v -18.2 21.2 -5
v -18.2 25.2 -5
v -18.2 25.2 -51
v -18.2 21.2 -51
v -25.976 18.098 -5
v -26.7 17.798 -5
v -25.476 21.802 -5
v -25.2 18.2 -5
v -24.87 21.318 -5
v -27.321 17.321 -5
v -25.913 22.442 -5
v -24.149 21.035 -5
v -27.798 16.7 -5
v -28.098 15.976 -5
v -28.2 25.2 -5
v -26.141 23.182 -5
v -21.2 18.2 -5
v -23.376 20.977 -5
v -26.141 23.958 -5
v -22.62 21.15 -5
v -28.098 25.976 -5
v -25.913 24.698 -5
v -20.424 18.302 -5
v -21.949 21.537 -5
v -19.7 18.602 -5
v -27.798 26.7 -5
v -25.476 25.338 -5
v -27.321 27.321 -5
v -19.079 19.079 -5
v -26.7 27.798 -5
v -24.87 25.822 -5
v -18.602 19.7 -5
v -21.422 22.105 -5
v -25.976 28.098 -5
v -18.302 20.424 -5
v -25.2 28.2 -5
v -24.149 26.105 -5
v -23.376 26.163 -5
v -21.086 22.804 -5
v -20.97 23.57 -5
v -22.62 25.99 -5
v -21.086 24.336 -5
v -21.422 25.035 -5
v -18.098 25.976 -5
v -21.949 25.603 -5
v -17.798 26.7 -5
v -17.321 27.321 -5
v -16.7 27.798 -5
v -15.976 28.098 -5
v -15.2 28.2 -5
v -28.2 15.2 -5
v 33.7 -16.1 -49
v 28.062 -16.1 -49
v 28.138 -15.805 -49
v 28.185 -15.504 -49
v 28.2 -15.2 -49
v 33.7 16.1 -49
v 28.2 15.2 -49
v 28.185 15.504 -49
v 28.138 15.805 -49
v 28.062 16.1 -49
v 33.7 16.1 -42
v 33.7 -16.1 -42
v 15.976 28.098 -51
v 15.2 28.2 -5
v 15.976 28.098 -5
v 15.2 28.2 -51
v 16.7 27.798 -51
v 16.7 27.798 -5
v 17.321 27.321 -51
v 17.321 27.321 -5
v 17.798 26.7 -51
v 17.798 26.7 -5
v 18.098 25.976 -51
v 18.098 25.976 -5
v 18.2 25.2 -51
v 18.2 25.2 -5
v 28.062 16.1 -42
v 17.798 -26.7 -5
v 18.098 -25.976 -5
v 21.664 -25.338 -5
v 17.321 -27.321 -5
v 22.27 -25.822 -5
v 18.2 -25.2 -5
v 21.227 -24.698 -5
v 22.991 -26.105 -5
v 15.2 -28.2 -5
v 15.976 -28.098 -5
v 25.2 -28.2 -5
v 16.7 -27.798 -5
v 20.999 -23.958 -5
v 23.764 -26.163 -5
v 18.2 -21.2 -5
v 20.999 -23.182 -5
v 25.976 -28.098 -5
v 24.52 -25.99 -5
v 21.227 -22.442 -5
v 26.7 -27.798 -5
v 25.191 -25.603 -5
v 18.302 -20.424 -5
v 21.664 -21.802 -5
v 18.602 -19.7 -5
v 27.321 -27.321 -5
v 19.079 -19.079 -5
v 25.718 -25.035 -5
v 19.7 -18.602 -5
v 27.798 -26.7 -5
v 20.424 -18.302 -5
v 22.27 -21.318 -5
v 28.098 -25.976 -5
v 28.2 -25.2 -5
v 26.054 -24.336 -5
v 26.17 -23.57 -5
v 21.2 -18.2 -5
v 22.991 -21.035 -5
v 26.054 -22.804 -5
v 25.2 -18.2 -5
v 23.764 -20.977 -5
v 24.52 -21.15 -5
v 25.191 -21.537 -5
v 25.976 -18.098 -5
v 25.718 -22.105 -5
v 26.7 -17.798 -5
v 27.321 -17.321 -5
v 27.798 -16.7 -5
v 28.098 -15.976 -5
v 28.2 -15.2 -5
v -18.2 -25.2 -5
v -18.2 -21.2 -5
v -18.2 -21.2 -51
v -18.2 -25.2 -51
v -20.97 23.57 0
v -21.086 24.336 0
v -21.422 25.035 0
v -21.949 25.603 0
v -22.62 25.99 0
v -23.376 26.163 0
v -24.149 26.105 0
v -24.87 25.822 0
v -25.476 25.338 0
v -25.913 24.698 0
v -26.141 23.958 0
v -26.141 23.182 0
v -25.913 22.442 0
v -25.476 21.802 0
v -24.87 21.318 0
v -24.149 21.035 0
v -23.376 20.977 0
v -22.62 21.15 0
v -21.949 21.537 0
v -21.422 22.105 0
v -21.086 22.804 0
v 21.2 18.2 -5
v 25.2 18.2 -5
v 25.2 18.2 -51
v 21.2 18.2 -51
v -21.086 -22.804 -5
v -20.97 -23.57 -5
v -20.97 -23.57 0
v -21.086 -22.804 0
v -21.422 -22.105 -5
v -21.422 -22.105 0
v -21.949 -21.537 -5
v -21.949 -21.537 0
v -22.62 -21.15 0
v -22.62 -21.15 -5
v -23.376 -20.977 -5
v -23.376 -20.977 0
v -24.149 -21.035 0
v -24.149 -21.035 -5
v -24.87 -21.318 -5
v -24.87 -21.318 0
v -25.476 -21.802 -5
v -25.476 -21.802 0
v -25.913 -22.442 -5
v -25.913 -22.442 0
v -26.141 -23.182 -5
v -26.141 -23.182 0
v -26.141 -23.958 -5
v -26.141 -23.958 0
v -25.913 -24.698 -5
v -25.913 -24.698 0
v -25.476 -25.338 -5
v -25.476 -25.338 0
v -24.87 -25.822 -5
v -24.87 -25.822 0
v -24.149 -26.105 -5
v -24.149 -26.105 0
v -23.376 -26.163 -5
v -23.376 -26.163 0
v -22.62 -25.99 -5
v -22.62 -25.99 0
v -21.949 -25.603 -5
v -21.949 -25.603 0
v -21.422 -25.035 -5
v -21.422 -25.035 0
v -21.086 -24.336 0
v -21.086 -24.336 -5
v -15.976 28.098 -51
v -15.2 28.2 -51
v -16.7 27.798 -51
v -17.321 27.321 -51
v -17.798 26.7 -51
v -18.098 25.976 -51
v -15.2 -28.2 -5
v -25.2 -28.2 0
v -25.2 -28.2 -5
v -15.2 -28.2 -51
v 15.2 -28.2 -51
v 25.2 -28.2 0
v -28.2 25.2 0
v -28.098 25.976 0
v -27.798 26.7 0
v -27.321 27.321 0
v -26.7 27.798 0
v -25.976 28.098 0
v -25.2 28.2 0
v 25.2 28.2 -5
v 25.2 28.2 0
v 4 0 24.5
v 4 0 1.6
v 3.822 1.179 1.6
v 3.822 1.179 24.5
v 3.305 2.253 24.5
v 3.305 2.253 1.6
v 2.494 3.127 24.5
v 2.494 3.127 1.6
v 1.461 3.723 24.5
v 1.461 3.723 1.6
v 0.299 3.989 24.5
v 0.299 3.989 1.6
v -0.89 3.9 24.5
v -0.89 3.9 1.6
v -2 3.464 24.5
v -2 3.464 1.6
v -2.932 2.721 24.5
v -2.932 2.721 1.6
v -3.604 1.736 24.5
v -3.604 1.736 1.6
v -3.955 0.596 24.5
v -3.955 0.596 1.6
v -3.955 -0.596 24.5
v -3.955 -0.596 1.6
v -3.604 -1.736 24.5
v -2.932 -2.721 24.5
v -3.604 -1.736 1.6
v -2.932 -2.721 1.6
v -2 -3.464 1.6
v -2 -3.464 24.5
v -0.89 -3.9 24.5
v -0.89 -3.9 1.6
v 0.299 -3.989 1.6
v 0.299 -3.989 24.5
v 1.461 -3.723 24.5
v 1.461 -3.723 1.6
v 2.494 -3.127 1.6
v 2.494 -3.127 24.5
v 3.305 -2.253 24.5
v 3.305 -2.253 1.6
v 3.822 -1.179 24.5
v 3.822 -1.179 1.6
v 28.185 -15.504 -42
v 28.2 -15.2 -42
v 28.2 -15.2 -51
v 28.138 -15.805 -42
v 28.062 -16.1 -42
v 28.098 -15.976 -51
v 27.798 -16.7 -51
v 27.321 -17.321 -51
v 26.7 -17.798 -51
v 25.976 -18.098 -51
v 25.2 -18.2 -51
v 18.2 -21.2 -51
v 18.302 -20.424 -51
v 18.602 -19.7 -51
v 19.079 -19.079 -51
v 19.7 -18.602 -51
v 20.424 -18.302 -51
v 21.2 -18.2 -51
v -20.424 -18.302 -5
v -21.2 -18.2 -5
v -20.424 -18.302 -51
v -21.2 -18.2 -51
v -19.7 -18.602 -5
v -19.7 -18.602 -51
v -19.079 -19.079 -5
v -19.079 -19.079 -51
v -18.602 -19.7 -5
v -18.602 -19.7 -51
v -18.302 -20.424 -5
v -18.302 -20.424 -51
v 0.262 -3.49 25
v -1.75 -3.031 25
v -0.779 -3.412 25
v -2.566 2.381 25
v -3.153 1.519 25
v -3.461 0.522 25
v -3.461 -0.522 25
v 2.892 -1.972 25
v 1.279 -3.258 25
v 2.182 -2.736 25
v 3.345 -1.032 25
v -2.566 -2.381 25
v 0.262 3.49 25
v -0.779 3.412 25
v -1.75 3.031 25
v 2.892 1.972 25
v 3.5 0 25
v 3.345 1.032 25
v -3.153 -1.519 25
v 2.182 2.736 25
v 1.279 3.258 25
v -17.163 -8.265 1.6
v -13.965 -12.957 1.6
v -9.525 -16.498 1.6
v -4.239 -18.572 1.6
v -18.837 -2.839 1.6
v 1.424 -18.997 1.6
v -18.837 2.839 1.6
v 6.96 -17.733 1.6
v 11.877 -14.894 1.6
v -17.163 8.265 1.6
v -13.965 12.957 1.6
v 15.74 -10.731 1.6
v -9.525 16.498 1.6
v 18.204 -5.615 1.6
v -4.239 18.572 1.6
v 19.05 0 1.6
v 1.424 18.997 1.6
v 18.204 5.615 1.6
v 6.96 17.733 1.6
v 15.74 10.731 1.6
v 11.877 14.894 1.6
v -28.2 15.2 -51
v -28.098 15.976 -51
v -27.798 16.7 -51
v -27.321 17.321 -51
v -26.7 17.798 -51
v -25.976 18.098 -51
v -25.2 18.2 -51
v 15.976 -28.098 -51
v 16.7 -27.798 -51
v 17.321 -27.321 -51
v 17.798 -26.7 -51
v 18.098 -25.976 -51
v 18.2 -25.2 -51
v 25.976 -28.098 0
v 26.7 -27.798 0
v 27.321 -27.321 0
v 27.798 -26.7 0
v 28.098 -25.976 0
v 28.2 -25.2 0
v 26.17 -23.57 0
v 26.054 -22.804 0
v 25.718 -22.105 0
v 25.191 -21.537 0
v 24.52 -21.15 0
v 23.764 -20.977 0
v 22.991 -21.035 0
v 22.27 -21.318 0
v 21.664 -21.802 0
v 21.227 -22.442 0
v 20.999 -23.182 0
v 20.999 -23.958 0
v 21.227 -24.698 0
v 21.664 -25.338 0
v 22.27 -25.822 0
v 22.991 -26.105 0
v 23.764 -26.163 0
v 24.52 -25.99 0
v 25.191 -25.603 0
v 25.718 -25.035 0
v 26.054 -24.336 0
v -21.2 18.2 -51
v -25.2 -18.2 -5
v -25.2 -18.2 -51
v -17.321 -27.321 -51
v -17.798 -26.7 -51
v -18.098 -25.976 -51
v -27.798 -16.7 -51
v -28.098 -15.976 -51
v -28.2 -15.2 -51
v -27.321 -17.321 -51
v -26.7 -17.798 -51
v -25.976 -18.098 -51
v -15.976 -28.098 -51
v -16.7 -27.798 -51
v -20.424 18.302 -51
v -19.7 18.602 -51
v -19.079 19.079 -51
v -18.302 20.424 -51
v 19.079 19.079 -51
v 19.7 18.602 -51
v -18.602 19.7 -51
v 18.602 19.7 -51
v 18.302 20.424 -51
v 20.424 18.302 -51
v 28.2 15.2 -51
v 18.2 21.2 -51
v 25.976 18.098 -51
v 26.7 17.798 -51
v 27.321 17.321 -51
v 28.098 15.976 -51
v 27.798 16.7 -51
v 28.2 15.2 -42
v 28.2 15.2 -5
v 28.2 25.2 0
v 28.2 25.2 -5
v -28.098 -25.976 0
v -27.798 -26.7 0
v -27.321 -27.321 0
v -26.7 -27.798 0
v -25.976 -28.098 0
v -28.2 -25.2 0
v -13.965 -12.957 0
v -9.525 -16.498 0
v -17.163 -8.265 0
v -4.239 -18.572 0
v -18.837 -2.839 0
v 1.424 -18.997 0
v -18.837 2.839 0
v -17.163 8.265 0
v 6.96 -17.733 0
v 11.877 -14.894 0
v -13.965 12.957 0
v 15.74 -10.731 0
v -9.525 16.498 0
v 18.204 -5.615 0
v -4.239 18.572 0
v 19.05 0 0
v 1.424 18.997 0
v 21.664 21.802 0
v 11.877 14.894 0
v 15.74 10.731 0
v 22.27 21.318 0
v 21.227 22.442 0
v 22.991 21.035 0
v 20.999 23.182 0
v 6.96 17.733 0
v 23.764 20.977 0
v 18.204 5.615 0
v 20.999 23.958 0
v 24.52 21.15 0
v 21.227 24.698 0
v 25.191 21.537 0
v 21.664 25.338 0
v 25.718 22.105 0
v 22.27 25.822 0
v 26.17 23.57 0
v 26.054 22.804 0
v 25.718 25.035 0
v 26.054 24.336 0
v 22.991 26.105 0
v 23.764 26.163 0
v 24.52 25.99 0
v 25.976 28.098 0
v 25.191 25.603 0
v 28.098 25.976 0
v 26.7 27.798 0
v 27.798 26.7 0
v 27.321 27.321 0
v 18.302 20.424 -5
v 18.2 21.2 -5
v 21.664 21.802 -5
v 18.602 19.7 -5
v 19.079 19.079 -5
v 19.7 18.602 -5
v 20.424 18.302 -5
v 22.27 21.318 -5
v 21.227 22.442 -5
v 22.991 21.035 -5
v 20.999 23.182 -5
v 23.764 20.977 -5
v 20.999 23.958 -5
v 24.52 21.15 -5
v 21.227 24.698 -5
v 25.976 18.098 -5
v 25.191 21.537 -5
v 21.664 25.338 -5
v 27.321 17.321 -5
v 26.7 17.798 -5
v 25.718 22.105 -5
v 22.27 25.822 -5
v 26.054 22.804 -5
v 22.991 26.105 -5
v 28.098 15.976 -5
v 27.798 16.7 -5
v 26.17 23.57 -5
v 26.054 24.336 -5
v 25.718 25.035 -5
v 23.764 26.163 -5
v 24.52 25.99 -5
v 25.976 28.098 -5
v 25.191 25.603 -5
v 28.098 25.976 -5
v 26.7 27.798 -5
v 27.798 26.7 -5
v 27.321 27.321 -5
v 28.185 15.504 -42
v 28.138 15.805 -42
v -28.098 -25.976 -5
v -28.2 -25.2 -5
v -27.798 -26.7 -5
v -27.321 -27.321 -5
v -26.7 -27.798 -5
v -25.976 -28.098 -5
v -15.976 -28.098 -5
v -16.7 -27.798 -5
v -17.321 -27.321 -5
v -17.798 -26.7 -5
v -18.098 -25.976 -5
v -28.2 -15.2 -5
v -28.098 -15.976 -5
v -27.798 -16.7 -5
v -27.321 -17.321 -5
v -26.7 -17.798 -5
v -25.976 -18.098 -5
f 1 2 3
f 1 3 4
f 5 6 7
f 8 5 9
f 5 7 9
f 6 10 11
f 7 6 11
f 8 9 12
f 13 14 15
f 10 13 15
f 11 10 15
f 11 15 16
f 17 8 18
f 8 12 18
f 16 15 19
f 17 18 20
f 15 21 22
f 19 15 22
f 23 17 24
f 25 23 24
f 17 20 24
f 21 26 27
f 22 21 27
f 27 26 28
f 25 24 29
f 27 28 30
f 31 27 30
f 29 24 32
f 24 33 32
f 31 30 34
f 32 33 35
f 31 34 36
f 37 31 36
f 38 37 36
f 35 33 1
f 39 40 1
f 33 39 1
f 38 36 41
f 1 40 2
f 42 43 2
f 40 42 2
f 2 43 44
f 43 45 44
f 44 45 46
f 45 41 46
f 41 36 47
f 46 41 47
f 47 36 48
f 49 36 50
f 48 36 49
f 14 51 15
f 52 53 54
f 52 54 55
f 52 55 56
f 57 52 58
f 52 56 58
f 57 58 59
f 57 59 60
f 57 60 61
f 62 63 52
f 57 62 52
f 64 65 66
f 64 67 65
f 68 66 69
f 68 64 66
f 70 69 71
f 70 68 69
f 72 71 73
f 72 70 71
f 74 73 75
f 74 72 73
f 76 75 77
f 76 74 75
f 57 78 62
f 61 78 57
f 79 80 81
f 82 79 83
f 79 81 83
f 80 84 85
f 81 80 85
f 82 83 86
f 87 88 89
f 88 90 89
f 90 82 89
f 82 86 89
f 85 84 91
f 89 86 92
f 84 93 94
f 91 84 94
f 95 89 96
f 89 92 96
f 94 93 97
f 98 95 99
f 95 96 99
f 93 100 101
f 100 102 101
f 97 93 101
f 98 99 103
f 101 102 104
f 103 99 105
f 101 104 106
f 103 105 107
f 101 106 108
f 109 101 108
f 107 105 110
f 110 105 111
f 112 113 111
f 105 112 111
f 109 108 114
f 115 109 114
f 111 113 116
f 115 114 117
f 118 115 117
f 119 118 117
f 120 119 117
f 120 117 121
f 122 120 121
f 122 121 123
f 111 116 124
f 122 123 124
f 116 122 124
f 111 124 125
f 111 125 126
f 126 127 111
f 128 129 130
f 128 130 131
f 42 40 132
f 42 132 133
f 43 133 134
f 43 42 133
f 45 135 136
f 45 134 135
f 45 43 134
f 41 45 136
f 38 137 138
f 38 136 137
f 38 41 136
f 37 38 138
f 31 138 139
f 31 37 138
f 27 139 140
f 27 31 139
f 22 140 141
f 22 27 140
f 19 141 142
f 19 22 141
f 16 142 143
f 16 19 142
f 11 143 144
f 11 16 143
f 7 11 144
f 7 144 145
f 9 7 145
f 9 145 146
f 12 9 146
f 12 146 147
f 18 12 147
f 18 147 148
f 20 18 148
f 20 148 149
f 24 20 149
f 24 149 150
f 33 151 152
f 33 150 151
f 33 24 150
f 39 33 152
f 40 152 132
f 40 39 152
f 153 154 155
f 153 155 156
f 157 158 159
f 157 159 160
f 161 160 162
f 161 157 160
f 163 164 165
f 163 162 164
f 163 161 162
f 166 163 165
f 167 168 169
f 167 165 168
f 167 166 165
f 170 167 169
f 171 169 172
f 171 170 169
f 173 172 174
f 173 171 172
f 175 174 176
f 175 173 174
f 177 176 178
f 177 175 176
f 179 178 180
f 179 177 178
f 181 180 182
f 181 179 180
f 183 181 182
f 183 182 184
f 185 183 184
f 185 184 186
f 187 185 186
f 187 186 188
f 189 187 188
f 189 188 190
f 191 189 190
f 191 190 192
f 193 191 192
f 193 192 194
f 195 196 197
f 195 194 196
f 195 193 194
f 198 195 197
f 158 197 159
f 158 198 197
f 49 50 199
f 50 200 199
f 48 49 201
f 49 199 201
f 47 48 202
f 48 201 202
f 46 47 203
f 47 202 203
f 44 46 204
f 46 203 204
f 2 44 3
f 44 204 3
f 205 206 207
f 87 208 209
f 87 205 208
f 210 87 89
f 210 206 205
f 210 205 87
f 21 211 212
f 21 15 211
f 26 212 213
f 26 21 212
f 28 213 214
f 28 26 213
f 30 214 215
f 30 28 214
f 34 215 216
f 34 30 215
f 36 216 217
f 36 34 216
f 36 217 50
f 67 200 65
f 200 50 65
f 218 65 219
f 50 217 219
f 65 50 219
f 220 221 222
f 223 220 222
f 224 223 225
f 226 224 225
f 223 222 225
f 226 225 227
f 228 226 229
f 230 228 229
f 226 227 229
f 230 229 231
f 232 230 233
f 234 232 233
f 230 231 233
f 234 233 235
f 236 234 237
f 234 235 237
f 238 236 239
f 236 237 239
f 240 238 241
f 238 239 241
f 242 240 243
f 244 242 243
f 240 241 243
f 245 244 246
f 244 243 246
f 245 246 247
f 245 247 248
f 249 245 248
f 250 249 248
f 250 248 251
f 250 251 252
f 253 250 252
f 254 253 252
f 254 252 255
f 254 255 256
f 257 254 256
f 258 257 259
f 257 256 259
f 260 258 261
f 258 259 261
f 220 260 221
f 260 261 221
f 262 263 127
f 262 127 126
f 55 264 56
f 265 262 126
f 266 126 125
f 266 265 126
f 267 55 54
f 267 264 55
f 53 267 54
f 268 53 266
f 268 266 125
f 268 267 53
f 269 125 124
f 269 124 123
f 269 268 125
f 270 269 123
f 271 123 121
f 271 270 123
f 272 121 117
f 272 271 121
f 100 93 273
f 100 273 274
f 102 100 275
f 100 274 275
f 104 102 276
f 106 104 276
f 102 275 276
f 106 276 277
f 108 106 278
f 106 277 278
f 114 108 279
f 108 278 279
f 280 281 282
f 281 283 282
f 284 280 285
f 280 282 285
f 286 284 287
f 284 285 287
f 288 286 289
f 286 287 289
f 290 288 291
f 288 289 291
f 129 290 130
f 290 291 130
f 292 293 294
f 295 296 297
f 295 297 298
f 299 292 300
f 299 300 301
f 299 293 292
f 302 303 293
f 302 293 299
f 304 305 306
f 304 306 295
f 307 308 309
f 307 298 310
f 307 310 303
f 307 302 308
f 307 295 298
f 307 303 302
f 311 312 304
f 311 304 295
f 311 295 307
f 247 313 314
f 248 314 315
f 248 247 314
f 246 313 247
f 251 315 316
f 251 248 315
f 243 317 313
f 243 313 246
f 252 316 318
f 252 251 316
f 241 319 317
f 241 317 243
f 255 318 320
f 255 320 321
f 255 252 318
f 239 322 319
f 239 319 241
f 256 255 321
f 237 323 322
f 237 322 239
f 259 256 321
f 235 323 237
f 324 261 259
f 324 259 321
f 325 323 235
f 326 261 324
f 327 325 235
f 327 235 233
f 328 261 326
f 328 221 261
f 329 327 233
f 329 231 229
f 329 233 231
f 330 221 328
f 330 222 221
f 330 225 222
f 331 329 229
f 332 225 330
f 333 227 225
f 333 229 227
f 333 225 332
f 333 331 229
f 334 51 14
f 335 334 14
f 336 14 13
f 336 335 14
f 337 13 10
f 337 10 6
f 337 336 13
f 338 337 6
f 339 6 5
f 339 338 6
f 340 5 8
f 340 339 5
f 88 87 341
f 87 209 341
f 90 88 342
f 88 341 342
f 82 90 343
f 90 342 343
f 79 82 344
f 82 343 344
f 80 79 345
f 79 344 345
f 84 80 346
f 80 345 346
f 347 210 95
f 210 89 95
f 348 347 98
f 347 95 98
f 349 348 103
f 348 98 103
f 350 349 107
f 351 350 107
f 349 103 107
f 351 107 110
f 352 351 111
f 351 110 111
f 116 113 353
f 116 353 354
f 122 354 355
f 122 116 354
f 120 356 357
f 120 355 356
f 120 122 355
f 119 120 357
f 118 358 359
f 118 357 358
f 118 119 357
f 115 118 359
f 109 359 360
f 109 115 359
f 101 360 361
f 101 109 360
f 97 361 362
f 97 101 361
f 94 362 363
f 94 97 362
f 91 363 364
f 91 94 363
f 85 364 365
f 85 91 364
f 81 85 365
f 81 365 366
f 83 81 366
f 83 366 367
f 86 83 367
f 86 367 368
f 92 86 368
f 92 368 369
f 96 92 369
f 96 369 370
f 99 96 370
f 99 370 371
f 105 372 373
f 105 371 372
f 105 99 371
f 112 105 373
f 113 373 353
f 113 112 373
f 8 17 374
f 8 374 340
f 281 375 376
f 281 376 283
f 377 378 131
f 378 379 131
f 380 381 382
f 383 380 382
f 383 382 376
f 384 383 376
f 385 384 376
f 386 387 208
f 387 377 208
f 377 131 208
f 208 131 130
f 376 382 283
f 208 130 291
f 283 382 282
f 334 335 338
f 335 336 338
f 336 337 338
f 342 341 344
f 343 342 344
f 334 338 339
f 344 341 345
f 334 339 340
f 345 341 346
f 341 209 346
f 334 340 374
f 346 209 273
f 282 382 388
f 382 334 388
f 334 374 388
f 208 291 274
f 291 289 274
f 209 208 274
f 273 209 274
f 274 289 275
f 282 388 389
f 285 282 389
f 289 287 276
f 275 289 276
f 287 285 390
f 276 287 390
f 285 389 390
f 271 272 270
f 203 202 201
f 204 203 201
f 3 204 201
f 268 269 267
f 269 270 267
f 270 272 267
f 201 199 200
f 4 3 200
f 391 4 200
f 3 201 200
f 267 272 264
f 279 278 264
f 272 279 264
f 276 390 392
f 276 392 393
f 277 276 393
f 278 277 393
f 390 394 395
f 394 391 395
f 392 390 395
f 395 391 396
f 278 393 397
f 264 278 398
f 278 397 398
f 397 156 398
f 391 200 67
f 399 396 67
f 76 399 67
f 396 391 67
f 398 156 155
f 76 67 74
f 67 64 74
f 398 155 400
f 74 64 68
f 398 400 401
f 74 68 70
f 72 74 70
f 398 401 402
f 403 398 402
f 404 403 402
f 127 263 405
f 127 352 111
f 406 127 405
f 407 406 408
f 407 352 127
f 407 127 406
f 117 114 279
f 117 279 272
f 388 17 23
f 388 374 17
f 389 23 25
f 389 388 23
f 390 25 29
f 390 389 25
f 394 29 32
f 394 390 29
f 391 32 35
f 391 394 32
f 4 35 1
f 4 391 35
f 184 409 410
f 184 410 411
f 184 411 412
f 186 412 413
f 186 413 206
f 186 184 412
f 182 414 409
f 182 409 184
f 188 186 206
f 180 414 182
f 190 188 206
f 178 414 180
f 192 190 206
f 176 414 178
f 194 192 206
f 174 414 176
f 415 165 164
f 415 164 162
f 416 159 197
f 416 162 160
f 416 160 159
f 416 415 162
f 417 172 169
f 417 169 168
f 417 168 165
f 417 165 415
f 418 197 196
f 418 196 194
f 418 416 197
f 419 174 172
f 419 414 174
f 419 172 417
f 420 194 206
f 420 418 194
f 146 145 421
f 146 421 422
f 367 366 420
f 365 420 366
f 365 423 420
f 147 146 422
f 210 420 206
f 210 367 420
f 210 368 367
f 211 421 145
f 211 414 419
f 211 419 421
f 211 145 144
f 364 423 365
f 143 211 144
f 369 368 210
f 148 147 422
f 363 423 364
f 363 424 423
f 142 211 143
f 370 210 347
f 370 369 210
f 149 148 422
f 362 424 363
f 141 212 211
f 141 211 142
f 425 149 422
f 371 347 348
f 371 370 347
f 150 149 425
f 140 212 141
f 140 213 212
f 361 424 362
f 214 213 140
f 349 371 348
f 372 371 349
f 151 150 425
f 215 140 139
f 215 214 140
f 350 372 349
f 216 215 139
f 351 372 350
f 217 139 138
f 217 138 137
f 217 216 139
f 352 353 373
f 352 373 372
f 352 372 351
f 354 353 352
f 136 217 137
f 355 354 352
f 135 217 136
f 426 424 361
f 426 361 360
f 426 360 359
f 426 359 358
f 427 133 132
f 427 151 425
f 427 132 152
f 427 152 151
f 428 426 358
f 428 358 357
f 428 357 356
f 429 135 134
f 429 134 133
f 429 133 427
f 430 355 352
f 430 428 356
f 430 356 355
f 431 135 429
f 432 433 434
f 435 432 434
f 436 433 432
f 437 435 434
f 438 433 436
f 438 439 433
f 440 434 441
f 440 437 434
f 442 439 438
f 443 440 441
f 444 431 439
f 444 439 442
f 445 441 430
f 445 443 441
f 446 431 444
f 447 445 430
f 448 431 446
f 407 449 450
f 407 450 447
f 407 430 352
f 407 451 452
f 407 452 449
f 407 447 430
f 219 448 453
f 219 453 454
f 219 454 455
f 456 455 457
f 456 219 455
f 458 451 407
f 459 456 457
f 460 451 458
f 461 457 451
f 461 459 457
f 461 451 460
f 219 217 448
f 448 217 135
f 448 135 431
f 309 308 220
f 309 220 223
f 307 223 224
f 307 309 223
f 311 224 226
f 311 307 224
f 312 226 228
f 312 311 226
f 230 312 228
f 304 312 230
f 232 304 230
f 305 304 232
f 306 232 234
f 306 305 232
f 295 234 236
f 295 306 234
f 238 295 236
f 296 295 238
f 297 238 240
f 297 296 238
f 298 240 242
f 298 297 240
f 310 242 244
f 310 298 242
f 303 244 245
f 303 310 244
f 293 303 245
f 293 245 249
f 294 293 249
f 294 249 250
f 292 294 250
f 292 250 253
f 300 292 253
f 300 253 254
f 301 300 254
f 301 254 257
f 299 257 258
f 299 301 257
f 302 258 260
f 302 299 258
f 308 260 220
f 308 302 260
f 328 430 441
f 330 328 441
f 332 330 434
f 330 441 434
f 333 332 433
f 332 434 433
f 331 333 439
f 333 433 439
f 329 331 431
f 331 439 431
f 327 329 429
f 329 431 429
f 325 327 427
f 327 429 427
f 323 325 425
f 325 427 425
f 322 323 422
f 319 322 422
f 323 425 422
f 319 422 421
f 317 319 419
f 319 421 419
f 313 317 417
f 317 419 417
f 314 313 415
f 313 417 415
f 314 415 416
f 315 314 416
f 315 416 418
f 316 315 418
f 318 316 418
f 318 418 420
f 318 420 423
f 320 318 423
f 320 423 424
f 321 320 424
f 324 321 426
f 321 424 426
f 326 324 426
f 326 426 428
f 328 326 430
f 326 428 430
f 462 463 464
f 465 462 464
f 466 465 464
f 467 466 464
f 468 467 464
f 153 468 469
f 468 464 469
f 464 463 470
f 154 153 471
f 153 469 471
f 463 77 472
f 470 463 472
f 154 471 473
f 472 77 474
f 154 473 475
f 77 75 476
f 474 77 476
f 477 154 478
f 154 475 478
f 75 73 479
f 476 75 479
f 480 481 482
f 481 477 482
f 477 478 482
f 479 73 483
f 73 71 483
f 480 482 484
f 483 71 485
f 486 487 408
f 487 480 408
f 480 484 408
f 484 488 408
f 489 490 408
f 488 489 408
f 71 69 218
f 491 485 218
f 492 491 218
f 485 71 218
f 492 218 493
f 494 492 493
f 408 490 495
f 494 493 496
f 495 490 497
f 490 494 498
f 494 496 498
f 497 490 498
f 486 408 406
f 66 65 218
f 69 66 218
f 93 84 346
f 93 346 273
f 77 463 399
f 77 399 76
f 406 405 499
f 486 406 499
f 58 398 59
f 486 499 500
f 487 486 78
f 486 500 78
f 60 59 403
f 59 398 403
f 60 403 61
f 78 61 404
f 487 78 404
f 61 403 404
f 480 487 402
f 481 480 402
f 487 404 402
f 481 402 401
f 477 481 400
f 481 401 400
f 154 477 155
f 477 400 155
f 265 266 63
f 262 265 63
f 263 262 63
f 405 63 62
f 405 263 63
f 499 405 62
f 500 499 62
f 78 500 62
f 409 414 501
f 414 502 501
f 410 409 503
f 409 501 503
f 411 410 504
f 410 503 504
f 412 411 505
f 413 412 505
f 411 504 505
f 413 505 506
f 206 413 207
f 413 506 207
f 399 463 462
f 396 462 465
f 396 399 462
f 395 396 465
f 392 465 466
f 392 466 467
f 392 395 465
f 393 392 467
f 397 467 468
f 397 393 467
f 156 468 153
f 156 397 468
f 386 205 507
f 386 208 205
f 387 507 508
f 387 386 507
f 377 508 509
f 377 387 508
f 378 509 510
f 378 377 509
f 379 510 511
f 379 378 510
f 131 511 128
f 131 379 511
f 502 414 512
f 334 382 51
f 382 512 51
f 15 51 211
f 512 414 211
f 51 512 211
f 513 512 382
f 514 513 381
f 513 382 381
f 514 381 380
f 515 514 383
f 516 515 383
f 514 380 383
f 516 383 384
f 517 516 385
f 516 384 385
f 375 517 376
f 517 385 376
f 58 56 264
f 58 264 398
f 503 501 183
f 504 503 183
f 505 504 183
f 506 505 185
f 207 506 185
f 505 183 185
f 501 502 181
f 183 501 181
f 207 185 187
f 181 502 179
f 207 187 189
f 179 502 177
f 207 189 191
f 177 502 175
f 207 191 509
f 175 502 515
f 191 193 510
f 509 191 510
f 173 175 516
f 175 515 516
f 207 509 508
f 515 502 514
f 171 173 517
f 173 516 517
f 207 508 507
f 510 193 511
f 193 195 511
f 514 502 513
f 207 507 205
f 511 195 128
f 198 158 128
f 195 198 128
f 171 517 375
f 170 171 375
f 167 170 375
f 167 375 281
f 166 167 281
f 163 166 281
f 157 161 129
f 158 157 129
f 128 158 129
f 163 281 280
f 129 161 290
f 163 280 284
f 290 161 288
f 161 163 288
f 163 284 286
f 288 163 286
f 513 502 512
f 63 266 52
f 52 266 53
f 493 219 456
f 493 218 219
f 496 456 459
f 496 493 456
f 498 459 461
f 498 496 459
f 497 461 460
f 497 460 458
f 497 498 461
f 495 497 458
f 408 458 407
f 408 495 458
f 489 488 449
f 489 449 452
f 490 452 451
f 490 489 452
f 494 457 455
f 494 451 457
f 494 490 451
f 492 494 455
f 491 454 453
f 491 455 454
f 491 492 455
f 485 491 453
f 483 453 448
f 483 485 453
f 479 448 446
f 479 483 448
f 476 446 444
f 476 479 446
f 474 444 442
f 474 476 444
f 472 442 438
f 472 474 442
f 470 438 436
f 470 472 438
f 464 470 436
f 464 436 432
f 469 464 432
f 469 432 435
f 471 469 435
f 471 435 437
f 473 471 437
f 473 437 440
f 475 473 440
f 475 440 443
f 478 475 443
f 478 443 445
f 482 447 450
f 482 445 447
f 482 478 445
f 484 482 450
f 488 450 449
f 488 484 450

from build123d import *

# Parameters (mm, degrees)
SKETCH1_W                = 56.4
SKETCH1_H                = 56.4
BOSS_EXTRUDE1_DEPTH      = 5
SKETCH2_R                = 19.05
BOSS_EXTRUDE2_DEPTH      = 1.6
SKETCH3_R                = 4
SHALF_DEPTH              = 23.4
CHAMFER1_SIZE            = 0.5
CUT_EXTRUDE1_DEPTH       = 48.068885689
CUT_EXTRUDE1_DEPTH_BACK  = 48.068885689
SKETCH4_R                = 2.6
FILLET1_R                = 3
BOSS_EXTRUDE4_DEPTH      = 46
FILLET2_R                = 3
BOSS_EXTRUDE5_DEPTH      = 5.5
BOSS_EXTRUDE5_DEPTH_BACK = 5
SKETCH6_W                = 7
SKETCH6_H                = 32.2


with BuildPart() as part:
    # Sketch1 → Boss-Extrude1 (new body)
    with BuildSketch(Plane.XY):
        Rectangle(SKETCH1_W, SKETCH1_H)
    extrude(amount=-BOSS_EXTRUDE1_DEPTH)

    # Sketch2 → Boss-Extrude2 (add)
    with BuildSketch(Plane.XY):
        Circle(SKETCH2_R)
    extrude(amount=BOSS_EXTRUDE2_DEPTH)

    # Sketch3 → Shalf (add)
    with BuildSketch(Plane.XY.offset(1.6)):
        Circle(SKETCH3_R)
    extrude(amount=SHALF_DEPTH)

    # Chamfer1
    chamfer1_edges = [part.edges().sort_by_distance(p)[0] for p in [
        (-4, 0, 25),
    ]]
    chamfer(chamfer1_edges, length=CHAMFER1_SIZE)

    # Sketch4 → Cut-Extrude1 (cut, two sides: drawn at the far end of the back side and taken through both)
    with BuildSketch(Plane.XY.offset(-CUT_EXTRUDE1_DEPTH_BACK)):
        with Locations((-23.57, 23.57)):
            Circle(SKETCH4_R)
        with Locations((23.57, 23.57)):
            Circle(SKETCH4_R)
        with Locations((-23.57, -23.57)):
            Circle(SKETCH4_R)
        with Locations((23.57, -23.57)):
            Circle(SKETCH4_R)
    extrude(amount=CUT_EXTRUDE1_DEPTH + CUT_EXTRUDE1_DEPTH_BACK, mode=Mode.SUBTRACT)

    # Fillet1
    fillet1_edges = [part.edges().sort_by_distance(p)[0] for p in [
        (28.2, -28.2, -2.5),
        (-28.2, -28.2, -2.5),
        (-28.2, 28.2, -2.5),
        (28.2, 28.2, -2.5),
    ]]
    fillet(fillet1_edges, radius=FILLET1_R)

    # Sketch5 → Boss-Extrude4 (add)
    with BuildSketch(Plane(origin=(0, 0, -5), x_dir=(-1, 0, 0), z_dir=(0, 0, -1))):
        Polygon((-18.2, 28.2), (18.2, 28.2), (18.2, 18.2), (28.2, 18.2), (28.2, -18.2), (18.2, -18.2), (18.2, -28.2), (-18.2, -28.2), (-18.2, -18.2), (-28.2, -18.2), (-28.2, 18.2), (-18.2, 18.2), align=None)
    extrude(amount=BOSS_EXTRUDE4_DEPTH)

    # Fillet2
    fillet2_edges = [part.edges().sort_by_distance(p)[0] for p in [
        (-18.2, 18.2, -28),
        (-18.2, 28.2, -28),
        (18.2, 28.2, -28),
        (18.2, 18.2, -28),
        (28.2, 18.2, -28),
        (28.2, -18.2, -28),
        (18.2, -18.2, -28),
        (18.2, -28.2, -28),
        (-18.2, -28.2, -28),
        (-18.2, -18.2, -28),
        (-28.2, -18.2, -28),
        (-28.2, 18.2, -28),
    ]]
    fillet(fillet2_edges, radius=FILLET2_R)

    # Sketch6 → Boss-Extrude5 (add, two sides: drawn at the far end of the back side and taken through both)
    with BuildSketch(Plane(origin=(28.2, 0, 0), x_dir=(0, 0, -1), z_dir=(1, 0, 0)).offset(-BOSS_EXTRUDE5_DEPTH_BACK)):
        with Locations((45.5, 0)):
            Rectangle(SKETCH6_W, SKETCH6_H)
    extrude(amount=BOSS_EXTRUDE5_DEPTH + BOSS_EXTRUDE5_DEPTH_BACK)


solid = part.part
